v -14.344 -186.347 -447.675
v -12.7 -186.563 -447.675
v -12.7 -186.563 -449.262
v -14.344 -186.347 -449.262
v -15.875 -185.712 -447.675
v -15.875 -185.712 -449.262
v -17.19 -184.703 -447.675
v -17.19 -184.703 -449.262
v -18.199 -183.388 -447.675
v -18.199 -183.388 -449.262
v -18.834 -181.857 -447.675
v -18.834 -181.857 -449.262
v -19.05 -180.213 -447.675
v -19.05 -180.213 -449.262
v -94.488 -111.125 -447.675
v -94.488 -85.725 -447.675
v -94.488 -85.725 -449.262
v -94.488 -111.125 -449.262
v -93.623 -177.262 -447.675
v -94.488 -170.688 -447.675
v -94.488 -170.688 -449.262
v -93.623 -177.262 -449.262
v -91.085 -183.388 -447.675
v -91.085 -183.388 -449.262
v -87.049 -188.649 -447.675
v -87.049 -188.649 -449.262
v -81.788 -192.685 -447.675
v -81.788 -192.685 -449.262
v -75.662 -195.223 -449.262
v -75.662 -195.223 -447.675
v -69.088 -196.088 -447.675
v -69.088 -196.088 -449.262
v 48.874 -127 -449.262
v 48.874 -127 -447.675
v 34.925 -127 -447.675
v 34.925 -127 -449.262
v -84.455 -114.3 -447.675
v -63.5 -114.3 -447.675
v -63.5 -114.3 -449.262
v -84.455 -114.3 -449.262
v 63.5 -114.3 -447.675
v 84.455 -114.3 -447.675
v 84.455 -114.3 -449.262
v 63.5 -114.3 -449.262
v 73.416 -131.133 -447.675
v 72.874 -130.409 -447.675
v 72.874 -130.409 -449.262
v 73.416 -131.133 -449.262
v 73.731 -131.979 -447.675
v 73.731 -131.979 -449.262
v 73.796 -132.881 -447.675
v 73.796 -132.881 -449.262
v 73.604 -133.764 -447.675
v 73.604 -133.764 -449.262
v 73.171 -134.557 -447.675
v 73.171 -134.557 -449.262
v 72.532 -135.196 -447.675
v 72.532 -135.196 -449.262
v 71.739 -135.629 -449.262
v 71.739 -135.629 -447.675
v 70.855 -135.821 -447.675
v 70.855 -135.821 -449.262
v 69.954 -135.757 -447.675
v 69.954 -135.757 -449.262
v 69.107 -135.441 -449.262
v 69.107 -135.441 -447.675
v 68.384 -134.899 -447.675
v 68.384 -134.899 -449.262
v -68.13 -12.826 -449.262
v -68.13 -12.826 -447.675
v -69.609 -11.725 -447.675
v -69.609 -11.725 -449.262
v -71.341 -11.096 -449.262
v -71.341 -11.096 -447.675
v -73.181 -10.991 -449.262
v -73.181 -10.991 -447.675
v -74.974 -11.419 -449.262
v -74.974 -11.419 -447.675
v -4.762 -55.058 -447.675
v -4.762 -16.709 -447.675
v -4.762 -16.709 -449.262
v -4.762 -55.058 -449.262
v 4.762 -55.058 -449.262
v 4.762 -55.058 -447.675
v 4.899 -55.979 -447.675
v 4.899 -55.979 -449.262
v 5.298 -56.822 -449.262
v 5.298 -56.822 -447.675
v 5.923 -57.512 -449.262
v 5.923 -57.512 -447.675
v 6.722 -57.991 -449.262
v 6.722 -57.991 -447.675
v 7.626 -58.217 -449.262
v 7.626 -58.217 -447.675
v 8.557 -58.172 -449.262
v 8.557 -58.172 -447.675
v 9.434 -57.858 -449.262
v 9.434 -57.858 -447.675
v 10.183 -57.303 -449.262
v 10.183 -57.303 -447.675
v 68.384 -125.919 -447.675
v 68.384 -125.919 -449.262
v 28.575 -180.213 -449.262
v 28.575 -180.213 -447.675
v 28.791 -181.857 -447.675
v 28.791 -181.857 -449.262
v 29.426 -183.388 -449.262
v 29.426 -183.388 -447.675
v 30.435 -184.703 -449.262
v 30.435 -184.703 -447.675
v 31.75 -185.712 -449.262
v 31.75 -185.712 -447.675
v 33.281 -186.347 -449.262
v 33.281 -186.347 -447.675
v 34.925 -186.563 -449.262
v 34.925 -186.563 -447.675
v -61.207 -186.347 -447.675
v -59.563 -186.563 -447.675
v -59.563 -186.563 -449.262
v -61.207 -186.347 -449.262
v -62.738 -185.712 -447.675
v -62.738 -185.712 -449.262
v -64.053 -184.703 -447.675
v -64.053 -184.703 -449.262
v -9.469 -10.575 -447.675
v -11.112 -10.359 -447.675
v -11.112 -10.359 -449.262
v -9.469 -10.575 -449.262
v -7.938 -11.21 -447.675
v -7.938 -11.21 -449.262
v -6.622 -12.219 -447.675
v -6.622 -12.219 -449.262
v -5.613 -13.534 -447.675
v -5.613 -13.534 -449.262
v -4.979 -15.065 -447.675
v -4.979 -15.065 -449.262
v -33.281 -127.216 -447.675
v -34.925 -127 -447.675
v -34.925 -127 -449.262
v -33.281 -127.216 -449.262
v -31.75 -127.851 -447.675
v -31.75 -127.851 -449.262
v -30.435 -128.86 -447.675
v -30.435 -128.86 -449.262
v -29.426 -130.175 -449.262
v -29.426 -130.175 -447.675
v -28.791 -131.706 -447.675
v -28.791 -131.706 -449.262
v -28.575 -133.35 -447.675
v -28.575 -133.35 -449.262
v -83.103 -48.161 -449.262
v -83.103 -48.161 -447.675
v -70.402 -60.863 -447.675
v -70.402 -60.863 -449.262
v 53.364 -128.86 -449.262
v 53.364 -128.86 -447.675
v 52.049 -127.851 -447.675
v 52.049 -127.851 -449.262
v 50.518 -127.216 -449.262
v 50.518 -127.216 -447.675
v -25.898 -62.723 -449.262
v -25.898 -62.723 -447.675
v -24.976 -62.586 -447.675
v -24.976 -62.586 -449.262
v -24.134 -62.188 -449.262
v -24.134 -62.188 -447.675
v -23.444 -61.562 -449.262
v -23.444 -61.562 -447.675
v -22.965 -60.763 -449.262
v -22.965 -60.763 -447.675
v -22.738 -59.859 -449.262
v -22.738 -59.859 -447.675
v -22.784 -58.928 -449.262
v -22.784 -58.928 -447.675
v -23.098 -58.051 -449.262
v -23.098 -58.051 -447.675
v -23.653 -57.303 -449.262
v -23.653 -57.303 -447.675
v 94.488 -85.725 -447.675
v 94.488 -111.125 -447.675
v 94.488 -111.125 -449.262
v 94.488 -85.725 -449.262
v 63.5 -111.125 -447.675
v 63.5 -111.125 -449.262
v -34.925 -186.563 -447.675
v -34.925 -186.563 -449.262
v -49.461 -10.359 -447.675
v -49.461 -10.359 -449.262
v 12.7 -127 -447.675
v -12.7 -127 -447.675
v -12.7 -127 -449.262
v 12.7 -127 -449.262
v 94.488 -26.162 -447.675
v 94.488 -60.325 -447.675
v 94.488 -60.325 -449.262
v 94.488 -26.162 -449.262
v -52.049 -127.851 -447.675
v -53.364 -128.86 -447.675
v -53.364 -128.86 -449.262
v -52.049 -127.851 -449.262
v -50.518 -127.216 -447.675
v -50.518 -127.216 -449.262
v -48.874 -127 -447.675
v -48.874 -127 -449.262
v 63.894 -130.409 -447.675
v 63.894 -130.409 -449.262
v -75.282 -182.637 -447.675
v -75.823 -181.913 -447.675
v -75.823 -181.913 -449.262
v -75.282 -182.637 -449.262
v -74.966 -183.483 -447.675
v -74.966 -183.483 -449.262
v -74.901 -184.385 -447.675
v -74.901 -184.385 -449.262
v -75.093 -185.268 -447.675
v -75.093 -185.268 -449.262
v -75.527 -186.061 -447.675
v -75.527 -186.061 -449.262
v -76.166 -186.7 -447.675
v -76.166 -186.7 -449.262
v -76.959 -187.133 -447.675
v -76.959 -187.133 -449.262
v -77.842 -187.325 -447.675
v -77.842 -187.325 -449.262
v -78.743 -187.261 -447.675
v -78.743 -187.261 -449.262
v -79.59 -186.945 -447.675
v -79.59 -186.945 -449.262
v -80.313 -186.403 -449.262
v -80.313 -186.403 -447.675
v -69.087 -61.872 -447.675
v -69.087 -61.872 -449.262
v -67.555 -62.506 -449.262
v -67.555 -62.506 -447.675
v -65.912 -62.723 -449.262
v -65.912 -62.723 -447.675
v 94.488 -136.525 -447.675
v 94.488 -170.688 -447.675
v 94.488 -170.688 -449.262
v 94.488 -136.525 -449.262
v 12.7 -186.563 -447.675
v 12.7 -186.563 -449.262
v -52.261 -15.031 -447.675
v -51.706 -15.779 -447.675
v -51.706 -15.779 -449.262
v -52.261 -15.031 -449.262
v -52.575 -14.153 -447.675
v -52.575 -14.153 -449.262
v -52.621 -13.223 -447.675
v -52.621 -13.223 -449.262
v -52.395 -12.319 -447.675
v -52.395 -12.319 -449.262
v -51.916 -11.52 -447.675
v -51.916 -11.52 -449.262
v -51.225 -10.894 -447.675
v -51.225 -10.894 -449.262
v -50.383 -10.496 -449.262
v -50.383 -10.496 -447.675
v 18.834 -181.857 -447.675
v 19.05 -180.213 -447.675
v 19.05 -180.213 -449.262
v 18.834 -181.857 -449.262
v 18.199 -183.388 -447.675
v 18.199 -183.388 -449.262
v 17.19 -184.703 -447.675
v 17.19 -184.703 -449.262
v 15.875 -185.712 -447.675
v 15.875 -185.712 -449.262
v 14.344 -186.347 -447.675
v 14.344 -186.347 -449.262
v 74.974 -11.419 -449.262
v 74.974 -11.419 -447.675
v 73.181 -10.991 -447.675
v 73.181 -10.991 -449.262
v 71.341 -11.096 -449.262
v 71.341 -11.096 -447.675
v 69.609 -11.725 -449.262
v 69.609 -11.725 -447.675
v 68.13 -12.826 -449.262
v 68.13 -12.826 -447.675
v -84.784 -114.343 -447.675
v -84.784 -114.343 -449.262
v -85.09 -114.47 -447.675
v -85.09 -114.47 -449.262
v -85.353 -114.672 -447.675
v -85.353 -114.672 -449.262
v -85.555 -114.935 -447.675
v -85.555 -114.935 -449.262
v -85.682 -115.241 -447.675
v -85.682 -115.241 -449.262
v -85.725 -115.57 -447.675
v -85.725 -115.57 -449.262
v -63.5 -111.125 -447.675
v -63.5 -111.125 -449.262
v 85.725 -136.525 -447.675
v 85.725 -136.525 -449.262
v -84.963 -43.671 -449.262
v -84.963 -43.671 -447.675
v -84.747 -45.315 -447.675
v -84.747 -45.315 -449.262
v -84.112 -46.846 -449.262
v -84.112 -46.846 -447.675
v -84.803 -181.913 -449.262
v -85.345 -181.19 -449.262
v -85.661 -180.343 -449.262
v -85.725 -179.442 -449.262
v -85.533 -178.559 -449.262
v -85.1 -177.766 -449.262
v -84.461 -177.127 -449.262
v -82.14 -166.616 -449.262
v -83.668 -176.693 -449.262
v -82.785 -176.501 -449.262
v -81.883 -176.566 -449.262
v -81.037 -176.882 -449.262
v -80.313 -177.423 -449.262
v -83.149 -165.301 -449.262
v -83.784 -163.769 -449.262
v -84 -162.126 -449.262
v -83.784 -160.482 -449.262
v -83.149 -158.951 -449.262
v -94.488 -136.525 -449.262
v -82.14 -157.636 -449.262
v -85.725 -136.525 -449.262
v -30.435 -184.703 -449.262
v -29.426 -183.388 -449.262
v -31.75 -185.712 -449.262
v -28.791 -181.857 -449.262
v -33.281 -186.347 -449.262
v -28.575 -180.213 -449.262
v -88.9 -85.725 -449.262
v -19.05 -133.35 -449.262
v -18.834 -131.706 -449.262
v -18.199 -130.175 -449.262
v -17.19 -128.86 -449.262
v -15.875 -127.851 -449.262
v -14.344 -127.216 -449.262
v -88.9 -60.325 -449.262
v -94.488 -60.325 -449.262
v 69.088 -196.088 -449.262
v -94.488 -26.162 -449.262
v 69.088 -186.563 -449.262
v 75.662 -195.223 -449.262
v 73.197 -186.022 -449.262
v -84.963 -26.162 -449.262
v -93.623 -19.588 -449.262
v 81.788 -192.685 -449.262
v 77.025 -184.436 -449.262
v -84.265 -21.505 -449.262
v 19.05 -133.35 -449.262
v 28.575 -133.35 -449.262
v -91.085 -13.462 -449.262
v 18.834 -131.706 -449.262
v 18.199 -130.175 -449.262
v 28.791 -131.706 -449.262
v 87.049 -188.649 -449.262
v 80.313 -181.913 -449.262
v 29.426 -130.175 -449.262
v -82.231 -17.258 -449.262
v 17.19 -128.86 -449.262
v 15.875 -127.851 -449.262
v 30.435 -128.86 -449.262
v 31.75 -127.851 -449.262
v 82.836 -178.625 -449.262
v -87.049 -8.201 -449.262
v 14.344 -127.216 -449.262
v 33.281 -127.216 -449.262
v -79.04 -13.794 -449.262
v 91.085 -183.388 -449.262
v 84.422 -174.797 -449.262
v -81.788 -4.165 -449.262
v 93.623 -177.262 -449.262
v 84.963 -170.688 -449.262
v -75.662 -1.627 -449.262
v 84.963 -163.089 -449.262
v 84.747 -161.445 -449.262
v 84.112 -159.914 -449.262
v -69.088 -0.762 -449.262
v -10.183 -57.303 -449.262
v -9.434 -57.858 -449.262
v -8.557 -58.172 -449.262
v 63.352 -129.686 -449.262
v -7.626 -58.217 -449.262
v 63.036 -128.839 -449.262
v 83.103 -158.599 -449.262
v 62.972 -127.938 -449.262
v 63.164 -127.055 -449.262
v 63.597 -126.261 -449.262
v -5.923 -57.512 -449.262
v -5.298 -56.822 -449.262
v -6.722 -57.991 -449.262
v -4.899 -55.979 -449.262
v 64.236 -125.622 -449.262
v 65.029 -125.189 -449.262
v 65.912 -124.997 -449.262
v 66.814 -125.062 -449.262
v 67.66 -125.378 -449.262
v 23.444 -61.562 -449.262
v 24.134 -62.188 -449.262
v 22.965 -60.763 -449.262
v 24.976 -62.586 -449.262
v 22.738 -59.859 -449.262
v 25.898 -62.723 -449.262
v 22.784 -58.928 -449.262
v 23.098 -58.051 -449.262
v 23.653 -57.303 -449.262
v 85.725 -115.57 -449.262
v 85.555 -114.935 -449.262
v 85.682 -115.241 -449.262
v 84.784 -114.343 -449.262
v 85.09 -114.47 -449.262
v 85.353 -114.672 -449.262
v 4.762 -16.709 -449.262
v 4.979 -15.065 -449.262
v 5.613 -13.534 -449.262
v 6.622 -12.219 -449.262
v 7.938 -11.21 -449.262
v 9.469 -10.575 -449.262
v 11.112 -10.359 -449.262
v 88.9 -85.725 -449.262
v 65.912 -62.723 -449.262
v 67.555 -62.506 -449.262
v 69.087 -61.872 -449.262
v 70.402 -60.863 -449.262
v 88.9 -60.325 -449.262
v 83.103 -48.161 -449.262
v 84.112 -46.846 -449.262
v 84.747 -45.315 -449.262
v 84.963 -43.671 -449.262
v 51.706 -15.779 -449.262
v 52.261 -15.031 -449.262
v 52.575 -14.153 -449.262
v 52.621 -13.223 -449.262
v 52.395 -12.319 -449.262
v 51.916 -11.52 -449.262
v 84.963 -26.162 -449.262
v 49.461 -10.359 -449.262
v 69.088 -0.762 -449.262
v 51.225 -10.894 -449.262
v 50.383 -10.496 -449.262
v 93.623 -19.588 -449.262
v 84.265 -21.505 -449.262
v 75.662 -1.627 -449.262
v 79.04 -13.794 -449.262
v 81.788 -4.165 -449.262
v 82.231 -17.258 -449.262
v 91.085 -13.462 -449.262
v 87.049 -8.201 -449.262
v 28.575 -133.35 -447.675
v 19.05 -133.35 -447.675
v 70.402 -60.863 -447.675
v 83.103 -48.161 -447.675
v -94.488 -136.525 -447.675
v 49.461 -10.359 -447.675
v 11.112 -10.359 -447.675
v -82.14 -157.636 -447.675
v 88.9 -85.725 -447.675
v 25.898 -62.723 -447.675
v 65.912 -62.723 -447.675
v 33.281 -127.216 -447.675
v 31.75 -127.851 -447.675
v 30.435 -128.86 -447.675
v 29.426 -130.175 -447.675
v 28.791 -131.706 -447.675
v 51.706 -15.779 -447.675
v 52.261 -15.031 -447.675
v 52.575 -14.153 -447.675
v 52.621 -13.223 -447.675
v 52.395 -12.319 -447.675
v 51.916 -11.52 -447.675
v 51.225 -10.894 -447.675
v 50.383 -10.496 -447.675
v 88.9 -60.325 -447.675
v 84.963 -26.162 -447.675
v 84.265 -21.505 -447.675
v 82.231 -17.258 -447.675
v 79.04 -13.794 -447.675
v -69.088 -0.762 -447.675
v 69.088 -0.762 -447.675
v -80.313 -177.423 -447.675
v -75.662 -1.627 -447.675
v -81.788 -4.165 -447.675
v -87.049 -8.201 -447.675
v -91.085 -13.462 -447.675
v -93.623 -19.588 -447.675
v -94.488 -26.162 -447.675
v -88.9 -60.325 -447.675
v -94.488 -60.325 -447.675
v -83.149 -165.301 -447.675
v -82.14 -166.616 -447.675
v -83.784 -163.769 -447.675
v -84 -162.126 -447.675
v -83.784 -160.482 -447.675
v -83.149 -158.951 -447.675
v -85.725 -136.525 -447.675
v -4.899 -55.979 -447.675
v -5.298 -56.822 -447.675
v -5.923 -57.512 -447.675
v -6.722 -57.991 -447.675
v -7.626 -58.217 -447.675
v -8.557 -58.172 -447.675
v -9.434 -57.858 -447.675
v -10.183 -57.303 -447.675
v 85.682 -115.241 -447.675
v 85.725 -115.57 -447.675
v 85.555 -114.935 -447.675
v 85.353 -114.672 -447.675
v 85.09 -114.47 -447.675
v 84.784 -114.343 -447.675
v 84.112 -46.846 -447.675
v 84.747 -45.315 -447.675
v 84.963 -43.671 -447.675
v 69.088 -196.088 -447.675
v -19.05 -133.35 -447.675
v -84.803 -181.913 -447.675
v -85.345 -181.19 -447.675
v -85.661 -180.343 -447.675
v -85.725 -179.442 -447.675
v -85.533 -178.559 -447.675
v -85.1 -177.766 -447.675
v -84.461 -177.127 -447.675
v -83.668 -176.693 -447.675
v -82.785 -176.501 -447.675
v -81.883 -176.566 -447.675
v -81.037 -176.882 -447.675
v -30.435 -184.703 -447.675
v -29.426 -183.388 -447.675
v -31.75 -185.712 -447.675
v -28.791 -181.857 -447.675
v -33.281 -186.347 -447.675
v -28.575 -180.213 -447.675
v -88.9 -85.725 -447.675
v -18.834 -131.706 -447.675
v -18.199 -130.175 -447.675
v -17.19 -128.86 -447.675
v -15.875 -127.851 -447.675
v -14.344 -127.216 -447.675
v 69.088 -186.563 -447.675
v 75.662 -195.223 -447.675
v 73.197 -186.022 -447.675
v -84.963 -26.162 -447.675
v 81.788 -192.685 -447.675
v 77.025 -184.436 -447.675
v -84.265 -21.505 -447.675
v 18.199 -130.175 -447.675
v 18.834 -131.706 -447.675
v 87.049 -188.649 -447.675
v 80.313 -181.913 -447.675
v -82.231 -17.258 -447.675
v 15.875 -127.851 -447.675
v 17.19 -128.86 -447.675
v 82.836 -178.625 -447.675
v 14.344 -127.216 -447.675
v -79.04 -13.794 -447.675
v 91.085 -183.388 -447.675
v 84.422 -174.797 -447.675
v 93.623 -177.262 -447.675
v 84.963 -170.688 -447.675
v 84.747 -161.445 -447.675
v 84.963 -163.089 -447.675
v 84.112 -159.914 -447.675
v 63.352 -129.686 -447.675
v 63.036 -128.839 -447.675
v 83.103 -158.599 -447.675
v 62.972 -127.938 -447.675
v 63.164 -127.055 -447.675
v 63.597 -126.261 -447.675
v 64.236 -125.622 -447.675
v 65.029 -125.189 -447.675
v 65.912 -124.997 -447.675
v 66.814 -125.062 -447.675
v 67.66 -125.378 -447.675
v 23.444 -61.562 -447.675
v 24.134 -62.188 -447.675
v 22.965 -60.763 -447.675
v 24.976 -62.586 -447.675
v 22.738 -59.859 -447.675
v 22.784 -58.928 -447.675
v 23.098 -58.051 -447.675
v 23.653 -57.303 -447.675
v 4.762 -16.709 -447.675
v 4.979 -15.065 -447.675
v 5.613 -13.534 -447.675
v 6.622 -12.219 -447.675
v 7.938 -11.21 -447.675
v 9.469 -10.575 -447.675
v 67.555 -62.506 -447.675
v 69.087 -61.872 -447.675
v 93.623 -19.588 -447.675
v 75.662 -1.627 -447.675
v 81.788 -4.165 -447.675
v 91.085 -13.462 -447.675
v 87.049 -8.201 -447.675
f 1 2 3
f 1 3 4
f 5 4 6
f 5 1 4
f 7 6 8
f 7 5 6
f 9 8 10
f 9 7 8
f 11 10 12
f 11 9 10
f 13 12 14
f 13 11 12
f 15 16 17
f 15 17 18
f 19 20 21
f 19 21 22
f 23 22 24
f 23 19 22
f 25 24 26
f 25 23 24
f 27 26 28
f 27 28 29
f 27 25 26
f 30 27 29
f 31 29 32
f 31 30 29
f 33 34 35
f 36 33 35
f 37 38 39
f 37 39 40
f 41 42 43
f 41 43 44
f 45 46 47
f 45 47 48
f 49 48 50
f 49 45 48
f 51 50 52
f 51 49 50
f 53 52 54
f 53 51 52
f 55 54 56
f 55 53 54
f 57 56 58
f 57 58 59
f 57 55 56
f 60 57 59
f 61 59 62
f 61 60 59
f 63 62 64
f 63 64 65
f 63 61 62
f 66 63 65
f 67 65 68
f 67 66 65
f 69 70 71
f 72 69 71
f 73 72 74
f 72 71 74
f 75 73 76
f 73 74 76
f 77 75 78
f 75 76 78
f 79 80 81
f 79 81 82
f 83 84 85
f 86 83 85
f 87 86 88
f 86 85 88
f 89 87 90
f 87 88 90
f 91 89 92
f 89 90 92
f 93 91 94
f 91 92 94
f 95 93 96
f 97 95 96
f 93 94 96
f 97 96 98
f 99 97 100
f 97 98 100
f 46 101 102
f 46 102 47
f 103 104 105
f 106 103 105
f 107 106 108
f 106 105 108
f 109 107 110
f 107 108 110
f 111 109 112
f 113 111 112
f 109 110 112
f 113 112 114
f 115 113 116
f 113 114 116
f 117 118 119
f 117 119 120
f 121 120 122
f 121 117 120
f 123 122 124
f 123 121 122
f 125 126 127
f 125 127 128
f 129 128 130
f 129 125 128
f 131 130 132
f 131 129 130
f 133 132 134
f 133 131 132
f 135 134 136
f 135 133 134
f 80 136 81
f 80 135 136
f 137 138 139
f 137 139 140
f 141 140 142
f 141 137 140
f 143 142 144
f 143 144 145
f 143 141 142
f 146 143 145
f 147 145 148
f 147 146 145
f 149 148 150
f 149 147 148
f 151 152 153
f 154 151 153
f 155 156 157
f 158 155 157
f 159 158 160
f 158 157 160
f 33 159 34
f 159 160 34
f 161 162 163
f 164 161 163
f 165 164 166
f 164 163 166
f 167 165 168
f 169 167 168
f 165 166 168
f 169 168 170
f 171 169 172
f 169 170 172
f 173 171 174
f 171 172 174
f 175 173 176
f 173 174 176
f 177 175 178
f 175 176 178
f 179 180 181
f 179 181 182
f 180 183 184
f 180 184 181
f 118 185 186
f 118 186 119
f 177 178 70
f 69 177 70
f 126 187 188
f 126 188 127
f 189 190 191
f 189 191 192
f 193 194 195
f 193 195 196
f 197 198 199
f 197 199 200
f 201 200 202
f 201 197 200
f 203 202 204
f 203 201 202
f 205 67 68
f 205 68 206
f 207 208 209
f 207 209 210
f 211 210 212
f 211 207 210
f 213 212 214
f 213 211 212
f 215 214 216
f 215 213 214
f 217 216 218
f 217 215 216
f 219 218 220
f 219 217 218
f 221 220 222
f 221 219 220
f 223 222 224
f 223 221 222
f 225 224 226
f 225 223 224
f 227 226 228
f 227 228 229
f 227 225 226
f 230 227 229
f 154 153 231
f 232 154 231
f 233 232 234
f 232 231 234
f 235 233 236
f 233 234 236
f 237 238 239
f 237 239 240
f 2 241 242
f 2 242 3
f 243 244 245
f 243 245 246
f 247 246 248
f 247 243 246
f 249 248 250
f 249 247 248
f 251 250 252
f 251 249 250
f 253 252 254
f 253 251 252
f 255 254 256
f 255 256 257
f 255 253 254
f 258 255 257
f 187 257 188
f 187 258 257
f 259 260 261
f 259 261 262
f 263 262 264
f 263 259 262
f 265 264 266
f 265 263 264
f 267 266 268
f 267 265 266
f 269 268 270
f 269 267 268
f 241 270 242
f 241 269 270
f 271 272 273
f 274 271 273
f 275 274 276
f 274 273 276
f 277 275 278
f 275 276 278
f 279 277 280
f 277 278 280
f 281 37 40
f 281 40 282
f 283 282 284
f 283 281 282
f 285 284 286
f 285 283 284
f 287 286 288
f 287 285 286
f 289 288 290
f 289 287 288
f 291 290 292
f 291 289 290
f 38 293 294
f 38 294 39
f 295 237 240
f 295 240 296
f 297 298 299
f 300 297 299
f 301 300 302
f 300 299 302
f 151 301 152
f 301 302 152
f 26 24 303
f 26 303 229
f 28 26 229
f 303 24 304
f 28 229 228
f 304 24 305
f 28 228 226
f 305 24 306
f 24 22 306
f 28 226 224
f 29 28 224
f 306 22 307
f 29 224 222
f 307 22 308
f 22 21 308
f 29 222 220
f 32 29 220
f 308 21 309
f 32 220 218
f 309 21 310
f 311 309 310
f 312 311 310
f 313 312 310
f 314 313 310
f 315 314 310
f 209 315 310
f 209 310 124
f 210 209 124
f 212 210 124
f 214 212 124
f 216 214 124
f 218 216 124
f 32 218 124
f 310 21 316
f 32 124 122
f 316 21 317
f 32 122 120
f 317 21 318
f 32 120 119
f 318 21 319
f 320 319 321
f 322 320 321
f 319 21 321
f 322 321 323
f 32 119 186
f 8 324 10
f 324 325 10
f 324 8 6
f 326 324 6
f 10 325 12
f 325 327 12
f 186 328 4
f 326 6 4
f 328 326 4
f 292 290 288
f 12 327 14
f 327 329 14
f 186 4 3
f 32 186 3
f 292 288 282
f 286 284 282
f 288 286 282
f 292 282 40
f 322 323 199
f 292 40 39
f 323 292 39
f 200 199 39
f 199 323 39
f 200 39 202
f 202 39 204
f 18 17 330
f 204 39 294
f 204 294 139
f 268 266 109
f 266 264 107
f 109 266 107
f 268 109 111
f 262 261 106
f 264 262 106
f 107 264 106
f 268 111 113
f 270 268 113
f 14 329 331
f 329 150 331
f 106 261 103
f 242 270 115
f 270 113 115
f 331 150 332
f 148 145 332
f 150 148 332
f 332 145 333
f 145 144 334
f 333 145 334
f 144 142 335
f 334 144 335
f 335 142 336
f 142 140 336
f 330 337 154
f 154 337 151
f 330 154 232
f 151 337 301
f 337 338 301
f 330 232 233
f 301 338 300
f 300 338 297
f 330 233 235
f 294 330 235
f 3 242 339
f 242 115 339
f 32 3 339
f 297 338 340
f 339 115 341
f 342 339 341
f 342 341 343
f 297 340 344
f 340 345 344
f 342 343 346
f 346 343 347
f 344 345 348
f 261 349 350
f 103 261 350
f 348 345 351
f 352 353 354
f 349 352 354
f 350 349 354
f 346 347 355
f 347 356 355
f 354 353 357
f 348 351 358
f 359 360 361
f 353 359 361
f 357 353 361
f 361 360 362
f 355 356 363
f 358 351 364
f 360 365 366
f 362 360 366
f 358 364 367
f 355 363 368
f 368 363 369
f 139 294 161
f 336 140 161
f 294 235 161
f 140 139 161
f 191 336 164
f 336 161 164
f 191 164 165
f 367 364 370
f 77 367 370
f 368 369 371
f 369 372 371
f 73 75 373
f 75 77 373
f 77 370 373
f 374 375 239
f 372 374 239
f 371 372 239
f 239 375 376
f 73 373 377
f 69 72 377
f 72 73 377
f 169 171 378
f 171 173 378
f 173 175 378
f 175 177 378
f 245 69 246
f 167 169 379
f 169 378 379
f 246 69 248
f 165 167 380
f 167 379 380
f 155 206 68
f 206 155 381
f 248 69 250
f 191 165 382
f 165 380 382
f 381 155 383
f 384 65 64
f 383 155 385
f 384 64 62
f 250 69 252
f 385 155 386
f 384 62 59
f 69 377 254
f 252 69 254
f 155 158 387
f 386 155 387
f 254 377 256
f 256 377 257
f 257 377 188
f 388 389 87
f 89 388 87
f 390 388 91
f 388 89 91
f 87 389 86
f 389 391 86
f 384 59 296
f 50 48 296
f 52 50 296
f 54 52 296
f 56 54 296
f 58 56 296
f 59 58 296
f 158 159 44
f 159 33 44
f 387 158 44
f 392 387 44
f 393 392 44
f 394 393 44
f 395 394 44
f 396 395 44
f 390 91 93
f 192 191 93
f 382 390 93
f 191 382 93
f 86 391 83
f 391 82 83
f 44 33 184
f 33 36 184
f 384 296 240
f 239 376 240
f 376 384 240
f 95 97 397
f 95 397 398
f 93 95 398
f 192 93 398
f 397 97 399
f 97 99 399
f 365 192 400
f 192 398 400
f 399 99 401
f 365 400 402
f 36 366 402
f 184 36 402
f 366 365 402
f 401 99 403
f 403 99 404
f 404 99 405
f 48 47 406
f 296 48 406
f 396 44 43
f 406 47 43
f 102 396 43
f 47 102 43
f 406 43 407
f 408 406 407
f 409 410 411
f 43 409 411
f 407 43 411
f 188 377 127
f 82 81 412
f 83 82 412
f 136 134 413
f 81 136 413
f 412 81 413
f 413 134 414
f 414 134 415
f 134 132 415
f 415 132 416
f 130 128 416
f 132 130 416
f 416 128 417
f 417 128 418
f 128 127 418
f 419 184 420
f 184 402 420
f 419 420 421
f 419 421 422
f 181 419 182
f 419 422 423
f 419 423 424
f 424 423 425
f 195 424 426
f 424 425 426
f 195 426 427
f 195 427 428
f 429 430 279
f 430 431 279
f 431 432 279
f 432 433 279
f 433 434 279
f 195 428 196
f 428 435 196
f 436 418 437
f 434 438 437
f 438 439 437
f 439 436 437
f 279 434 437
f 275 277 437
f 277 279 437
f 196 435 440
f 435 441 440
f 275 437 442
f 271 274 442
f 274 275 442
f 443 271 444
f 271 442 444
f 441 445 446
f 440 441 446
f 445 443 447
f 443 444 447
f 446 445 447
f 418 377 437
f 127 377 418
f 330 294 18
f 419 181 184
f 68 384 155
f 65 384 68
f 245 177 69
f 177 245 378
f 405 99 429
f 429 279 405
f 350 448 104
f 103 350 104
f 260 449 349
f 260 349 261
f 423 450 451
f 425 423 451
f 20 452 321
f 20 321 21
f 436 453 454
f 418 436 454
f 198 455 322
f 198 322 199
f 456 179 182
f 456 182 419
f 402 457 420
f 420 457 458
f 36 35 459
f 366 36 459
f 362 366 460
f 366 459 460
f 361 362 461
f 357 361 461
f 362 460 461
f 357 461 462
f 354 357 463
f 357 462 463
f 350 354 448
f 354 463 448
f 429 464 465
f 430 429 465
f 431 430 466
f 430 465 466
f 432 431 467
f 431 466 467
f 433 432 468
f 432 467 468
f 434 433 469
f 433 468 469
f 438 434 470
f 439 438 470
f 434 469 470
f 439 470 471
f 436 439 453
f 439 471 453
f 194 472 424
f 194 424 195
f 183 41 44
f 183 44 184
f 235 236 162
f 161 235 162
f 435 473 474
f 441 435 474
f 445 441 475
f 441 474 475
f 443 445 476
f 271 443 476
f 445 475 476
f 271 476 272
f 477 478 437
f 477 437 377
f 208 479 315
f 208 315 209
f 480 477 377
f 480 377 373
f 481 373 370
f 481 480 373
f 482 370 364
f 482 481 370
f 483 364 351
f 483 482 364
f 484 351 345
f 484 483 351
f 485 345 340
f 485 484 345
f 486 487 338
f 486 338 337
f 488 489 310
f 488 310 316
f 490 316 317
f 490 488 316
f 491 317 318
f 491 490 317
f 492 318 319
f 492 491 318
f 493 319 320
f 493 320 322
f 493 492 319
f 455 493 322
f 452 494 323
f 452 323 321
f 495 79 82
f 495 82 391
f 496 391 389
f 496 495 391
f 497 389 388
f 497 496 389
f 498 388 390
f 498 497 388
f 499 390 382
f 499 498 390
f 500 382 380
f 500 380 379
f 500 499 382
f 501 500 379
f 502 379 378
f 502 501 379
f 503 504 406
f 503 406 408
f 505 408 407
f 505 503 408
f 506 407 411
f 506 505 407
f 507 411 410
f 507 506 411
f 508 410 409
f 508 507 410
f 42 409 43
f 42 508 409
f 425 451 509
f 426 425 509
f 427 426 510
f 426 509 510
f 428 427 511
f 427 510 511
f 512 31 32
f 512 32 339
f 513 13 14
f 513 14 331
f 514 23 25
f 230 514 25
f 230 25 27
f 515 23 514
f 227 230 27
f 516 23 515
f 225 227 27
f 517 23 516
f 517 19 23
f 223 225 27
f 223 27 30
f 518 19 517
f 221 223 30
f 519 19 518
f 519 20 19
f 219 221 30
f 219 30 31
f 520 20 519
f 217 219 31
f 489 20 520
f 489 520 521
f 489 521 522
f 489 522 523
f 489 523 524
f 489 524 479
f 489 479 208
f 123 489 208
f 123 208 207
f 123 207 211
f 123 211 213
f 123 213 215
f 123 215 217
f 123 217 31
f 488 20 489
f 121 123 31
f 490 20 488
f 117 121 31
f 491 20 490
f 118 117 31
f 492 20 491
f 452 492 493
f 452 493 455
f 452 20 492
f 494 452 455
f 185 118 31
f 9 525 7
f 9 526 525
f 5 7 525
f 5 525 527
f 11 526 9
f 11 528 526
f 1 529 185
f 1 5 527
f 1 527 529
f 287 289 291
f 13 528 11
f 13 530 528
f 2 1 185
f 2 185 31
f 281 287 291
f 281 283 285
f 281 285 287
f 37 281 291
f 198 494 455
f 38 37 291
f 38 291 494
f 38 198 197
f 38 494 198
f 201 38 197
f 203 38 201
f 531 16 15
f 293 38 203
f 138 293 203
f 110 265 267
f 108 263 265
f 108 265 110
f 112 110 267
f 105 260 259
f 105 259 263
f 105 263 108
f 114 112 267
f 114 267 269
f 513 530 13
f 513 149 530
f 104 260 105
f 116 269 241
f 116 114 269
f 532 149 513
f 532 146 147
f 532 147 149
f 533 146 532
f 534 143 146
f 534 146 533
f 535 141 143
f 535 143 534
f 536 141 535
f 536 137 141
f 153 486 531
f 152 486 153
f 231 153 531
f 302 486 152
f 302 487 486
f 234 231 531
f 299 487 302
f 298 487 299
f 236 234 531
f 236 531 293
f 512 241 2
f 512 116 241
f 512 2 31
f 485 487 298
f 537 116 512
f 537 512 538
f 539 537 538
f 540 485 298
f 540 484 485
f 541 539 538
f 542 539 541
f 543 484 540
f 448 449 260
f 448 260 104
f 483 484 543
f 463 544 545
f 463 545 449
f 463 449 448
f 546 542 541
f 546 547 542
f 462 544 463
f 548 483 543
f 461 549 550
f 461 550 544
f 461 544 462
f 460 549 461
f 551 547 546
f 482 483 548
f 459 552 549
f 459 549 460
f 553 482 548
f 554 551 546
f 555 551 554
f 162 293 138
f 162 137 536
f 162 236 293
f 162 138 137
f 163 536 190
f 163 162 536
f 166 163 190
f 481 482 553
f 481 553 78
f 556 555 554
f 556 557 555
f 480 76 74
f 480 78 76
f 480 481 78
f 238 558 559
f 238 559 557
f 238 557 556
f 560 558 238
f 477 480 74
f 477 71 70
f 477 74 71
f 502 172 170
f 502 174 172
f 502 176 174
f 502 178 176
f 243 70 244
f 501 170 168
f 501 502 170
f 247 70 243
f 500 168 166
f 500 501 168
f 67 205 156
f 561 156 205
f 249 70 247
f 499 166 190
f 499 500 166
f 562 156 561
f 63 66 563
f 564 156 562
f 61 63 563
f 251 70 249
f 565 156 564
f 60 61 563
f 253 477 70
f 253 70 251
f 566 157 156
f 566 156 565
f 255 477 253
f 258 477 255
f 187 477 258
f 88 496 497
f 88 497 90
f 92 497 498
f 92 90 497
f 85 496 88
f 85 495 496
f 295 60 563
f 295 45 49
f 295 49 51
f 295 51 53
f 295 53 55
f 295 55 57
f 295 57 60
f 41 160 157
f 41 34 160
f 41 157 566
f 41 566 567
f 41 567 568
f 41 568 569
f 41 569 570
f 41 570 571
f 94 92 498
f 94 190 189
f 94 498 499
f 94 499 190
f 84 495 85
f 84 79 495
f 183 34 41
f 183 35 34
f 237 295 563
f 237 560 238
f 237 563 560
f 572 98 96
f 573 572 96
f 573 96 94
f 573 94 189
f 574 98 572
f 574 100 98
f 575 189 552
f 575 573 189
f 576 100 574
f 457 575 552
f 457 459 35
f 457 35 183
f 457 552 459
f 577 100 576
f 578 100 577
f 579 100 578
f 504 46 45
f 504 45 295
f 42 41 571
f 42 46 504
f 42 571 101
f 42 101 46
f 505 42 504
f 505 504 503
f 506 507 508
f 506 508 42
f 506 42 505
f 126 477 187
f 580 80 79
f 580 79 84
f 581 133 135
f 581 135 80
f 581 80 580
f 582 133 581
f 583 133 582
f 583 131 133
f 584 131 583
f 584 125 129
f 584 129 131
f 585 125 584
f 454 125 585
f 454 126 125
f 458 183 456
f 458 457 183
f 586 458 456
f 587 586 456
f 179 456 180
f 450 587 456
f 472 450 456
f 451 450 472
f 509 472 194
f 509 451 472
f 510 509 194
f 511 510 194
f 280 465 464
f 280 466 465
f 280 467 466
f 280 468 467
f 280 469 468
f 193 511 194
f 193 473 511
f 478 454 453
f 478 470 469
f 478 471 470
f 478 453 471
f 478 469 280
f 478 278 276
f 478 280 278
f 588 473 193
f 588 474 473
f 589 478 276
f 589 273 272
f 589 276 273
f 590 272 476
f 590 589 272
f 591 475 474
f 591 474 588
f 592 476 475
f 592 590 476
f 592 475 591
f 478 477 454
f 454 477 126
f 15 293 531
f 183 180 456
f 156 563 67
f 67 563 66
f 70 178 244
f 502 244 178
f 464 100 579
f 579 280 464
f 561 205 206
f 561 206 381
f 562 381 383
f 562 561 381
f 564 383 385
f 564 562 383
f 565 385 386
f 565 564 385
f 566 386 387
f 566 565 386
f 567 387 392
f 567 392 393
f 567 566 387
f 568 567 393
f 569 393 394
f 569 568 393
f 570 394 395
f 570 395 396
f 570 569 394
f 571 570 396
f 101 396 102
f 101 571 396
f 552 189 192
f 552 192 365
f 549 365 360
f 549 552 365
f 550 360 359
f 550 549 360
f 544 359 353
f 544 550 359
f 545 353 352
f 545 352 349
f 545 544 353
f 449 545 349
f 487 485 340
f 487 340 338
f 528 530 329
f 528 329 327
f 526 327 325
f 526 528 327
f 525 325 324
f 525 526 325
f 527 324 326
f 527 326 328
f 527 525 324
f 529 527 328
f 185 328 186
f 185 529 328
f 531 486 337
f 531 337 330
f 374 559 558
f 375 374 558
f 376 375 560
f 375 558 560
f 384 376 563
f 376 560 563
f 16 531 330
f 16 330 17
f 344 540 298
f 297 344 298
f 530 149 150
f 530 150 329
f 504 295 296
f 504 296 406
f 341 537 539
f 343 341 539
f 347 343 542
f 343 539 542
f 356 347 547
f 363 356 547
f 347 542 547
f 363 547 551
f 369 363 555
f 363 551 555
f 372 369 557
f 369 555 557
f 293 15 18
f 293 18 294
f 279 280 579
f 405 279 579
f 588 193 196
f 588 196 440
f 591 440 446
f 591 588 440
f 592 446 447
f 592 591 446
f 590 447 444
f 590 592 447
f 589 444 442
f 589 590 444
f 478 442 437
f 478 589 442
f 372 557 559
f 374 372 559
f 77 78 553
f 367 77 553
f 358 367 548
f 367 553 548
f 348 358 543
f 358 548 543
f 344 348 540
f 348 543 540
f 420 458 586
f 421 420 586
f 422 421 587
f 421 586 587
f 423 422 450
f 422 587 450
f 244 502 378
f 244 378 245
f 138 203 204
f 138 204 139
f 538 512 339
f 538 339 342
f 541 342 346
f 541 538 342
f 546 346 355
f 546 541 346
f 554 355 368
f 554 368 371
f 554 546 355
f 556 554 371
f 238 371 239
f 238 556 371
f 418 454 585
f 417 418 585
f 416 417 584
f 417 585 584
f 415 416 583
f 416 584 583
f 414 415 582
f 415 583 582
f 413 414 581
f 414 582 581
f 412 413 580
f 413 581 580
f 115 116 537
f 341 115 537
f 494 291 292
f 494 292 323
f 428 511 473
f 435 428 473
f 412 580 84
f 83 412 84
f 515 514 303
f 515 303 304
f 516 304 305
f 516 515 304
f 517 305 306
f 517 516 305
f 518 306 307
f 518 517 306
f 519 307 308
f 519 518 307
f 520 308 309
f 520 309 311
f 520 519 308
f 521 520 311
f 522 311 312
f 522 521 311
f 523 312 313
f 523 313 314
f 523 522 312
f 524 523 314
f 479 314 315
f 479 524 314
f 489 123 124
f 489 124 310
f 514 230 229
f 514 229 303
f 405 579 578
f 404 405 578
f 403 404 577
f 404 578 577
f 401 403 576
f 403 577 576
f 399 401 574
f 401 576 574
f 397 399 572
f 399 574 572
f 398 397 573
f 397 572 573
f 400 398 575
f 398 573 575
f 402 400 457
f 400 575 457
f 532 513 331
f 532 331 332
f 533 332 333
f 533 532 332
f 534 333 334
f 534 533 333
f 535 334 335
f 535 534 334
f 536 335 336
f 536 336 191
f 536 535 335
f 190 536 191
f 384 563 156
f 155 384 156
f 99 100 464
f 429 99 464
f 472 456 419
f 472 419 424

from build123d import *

# Parameters (mm, degrees)
BOSS_EXTRUDE1_DEPTH = 1.5875


with BuildPart() as part:
    # Sketch1 → Boss-Extrude1 (new body)
    with BuildSketch(Plane.XY.offset(-447.675)):
        with BuildLine():
            Line((94.488, -85.725), (88.9, -85.725))
            Line((88.9, -85.725), (88.9, -60.325))
            Line((88.9, -60.325), (94.488, -60.325))
            Line((94.488, -60.325), (94.488, -26.162))
            ThreePointArc((94.488, -26.162), (87.048512242, -8.201487758), (69.088, -0.762))
            Line((69.088, -0.762), (-69.088, -0.762))
            ThreePointArc((-69.088, -0.762), (-87.048512242, -8.201487758), (-94.488, -26.162))
            Line((-94.488, -26.162), (-94.488, -60.325))
            Line((-94.488, -60.325), (-88.9, -60.325))
            Line((-88.9, -60.325), (-88.9, -85.725))
            Line((-88.9, -85.725), (-94.488, -85.725))
            Line((-94.488, -85.725), (-94.488, -111.125))
            Line((-94.488, -111.125), (-63.5, -111.125))
            Line((-63.5, -111.125), (-63.5, -114.3))
            Line((-63.5, -114.3), (-84.455, -114.3))
            ThreePointArc((-84.455, -114.3), (-85.353025612, -114.671974388), (-85.725, -115.57))
            Line((-85.725, -115.57), (-85.725, -136.525))
            Line((-85.725, -136.525), (-94.488, -136.525))
            Line((-94.488, -136.525), (-94.488, -170.688))
            ThreePointArc((-94.488, -170.688), (-87.048512242, -188.648512242), (-69.088, -196.088))
            Line((-69.088, -196.088), (69.088, -196.088))
            ThreePointArc((69.088, -196.088), (87.048512242, -188.648512242), (94.488, -170.688))
            Line((94.488, -170.688), (94.488, -136.525))
            Line((94.488, -136.525), (85.725, -136.525))
            Line((85.725, -136.525), (85.725, -115.57))
            ThreePointArc((85.725, -115.57), (85.353025612, -114.671974388), (84.455, -114.3))
            Line((84.455, -114.3), (63.5, -114.3))
            Line((63.5, -114.3), (63.5, -111.125))
            Line((63.5, -111.125), (94.488, -111.125))
            Line((94.488, -111.125), (94.488, -85.725))
        make_face()
        with BuildLine():
            Line((-48.874039546, -127), (-34.925, -127))
            ThreePointArc((-34.925, -127), (-30.434871939, -128.859871939), (-28.575, -133.35))
            Line((-28.575, -133.35), (-28.575, -180.213))
            ThreePointArc((-28.575, -180.213), (-30.434871939, -184.703128061), (-34.925, -186.563))
            Line((-34.925, -186.563), (-59.563, -186.563))
            ThreePointArc((-59.563, -186.563), (-61.993039796, -186.079635031), (-64.053128061, -184.703128061))
            Line((-64.053128061, -184.703128061), (-82.140147834, -166.616108288))
            ThreePointArc((-82.140147834, -166.616108288), (-84.000019773, -162.125980227), (-82.140147834, -157.635852166))
            Line((-82.140147834, -157.635852166), (-53.364167607, -128.859871939))
            ThreePointArc((-53.364167607, -128.859871939), (-51.304079342, -127.483364969), (-48.874039546, -127))
        make_face(mode=Mode.SUBTRACT)
        with BuildLine():
            Line((28.575, -133.35), (28.575, -180.213))
            ThreePointArc((28.575, -180.213), (30.434871939, -184.703128061), (34.925, -186.563))
            Line((34.925, -186.563), (69.088, -186.563))
            ThreePointArc((69.088, -186.563), (80.313320151, -181.913320151), (84.963, -170.688))
            Line((84.963, -170.688), (84.963, -163.088960454))
            ThreePointArc((84.963, -163.088960454), (84.479635031, -160.658920658), (83.103128061, -158.598832393))
            Line((83.103128061, -158.598832393), (53.364167607, -128.859871939))
            ThreePointArc((53.364167607, -128.859871939), (51.304079342, -127.483364969), (48.874039546, -127))
            Line((48.874039546, -127), (34.925, -127))
            ThreePointArc((34.925, -127), (30.434871939, -128.859871939), (28.575, -133.35))
        make_face(mode=Mode.SUBTRACT)
        with BuildLine():
            Line((-12.7, -127), (12.7, -127))
            ThreePointArc((12.7, -127), (17.190128061, -128.859871939), (19.05, -133.35))
            Line((19.05, -133.35), (19.05, -180.213))
            ThreePointArc((19.05, -180.213), (17.190128061, -184.703128061), (12.7, -186.563))
            Line((12.7, -186.563), (-12.7, -186.563))
            ThreePointArc((-12.7, -186.563), (-17.190128061, -184.703128061), (-19.05, -180.213))
            Line((-19.05, -180.213), (-19.05, -133.35))
            ThreePointArc((-19.05, -133.35), (-17.190128061, -128.859871939), (-12.7, -127))
        make_face(mode=Mode.SUBTRACT)
        with BuildLine():
            Line((-84.963, -26.162), (-84.963, -43.671231637))
            ThreePointArc((-84.963, -43.671231637), (-84.479635031, -46.101271432), (-83.103128061, -48.161359697))
            Line((-83.103128061, -48.161359697), (-70.401634909, -60.862852849))
            ThreePointArc((-70.401634909, -60.862852849), (-68.341546644, -62.23935982), (-65.911506848, -62.722724789))
            Line((-65.911506848, -62.722724789), (-25.898012242, -62.722724789))
            ThreePointArc((-25.898012242, -62.722724789), (-22.964694726, -60.762744686), (-23.652948212, -57.302660758))
            Line((-23.652948212, -57.302660758), (-68.129730486, -12.825878484))
            ThreePointArc((-68.129730486, -12.825878484), (-71.341107932, -11.096095222), (-74.974430911, -11.418677575))
            ThreePointArc((-74.974430911, -11.418677575), (-82.230730228, -17.257828666), (-84.963, -26.162))
        make_face(mode=Mode.SUBTRACT)
        with BuildLine():
            Line((-49.461238683, -10.358858045), (-11.1125, -10.358858045))
            ThreePointArc((-11.1125, -10.358858045), (-6.622371939, -12.218729985), (-4.7625, -16.708858045))
            Line((-4.7625, -16.708858045), (-4.7625, -55.057596728))
            ThreePointArc((-4.7625, -55.057596728), (-6.722480102, -57.990914244), (-10.18256403, -57.302660758))
            Line((-10.18256403, -57.302660758), (-51.706302713, -15.778922075))
            ThreePointArc((-51.706302713, -15.778922075), (-52.394556199, -12.318838147), (-49.461238683, -10.358858045))
        make_face(mode=Mode.SUBTRACT)
        with BuildLine():
            Line((4.7625, -16.708858045), (4.7625, -55.057596728))
            ThreePointArc((4.7625, -55.057596728), (6.722480102, -57.990914244), (10.18256403, -57.302660758))
            Line((10.18256403, -57.302660758), (51.706302713, -15.778922075))
            ThreePointArc((51.706302713, -15.778922075), (52.394556199, -12.318838147), (49.461238683, -10.358858045))
            Line((49.461238683, -10.358858045), (11.1125, -10.358858045))
            ThreePointArc((11.1125, -10.358858045), (6.622371939, -12.218729985), (4.7625, -16.708858045))
        make_face(mode=Mode.SUBTRACT)
        with BuildLine():
            Line((68.129730486, -12.825878484), (23.652948212, -57.302660758))
            ThreePointArc((23.652948212, -57.302660758), (22.964694726, -60.762744686), (25.898012242, -62.722724789))
            Line((25.898012242, -62.722724789), (65.911506848, -62.722724789))
            ThreePointArc((65.911506848, -62.722724789), (68.341546644, -62.23935982), (70.401634909, -60.862852849))
            Line((70.401634909, -60.862852849), (83.103128061, -48.161359697))
            ThreePointArc((83.103128061, -48.161359697), (84.479635031, -46.101271432), (84.963, -43.671231637))
            Line((84.963, -43.671231637), (84.963, -26.162))
            ThreePointArc((84.963, -26.162), (82.230730228, -17.257828666), (74.974430911, -11.418677575))
            ThreePointArc((74.974430911, -11.418677575), (71.341107932, -11.096095222), (68.129730486, -12.825878484))
        make_face(mode=Mode.SUBTRACT)
        with BuildLine():
            Line((68.383887592, -125.919079683), (72.874015653, -130.409207744))
            ThreePointArc((72.874015653, -130.409207744), (72.874015653, -134.899335804), (68.383887592, -134.899335804))
            Line((68.383887592, -134.899335804), (63.893759532, -130.409207744))
            ThreePointArc((63.893759532, -130.409207744), (63.893759532, -125.919079683), (68.383887592, -125.919079683))
        make_face(mode=Mode.SUBTRACT)
        with BuildLine():
            Line((-80.313320151, -177.423192091), (-75.823192091, -181.913320151))
            ThreePointArc((-75.823192091, -181.913320151), (-75.823192091, -186.403448212), (-80.313320151, -186.403448212))
            Line((-80.313320151, -186.403448212), (-84.803448212, -181.913320151))
            ThreePointArc((-84.803448212, -181.913320151), (-84.803448212, -177.423192091), (-80.313320151, -177.423192091))
        make_face(mode=Mode.SUBTRACT)
    extrude(amount=-BOSS_EXTRUDE1_DEPTH)


solid = part.part
